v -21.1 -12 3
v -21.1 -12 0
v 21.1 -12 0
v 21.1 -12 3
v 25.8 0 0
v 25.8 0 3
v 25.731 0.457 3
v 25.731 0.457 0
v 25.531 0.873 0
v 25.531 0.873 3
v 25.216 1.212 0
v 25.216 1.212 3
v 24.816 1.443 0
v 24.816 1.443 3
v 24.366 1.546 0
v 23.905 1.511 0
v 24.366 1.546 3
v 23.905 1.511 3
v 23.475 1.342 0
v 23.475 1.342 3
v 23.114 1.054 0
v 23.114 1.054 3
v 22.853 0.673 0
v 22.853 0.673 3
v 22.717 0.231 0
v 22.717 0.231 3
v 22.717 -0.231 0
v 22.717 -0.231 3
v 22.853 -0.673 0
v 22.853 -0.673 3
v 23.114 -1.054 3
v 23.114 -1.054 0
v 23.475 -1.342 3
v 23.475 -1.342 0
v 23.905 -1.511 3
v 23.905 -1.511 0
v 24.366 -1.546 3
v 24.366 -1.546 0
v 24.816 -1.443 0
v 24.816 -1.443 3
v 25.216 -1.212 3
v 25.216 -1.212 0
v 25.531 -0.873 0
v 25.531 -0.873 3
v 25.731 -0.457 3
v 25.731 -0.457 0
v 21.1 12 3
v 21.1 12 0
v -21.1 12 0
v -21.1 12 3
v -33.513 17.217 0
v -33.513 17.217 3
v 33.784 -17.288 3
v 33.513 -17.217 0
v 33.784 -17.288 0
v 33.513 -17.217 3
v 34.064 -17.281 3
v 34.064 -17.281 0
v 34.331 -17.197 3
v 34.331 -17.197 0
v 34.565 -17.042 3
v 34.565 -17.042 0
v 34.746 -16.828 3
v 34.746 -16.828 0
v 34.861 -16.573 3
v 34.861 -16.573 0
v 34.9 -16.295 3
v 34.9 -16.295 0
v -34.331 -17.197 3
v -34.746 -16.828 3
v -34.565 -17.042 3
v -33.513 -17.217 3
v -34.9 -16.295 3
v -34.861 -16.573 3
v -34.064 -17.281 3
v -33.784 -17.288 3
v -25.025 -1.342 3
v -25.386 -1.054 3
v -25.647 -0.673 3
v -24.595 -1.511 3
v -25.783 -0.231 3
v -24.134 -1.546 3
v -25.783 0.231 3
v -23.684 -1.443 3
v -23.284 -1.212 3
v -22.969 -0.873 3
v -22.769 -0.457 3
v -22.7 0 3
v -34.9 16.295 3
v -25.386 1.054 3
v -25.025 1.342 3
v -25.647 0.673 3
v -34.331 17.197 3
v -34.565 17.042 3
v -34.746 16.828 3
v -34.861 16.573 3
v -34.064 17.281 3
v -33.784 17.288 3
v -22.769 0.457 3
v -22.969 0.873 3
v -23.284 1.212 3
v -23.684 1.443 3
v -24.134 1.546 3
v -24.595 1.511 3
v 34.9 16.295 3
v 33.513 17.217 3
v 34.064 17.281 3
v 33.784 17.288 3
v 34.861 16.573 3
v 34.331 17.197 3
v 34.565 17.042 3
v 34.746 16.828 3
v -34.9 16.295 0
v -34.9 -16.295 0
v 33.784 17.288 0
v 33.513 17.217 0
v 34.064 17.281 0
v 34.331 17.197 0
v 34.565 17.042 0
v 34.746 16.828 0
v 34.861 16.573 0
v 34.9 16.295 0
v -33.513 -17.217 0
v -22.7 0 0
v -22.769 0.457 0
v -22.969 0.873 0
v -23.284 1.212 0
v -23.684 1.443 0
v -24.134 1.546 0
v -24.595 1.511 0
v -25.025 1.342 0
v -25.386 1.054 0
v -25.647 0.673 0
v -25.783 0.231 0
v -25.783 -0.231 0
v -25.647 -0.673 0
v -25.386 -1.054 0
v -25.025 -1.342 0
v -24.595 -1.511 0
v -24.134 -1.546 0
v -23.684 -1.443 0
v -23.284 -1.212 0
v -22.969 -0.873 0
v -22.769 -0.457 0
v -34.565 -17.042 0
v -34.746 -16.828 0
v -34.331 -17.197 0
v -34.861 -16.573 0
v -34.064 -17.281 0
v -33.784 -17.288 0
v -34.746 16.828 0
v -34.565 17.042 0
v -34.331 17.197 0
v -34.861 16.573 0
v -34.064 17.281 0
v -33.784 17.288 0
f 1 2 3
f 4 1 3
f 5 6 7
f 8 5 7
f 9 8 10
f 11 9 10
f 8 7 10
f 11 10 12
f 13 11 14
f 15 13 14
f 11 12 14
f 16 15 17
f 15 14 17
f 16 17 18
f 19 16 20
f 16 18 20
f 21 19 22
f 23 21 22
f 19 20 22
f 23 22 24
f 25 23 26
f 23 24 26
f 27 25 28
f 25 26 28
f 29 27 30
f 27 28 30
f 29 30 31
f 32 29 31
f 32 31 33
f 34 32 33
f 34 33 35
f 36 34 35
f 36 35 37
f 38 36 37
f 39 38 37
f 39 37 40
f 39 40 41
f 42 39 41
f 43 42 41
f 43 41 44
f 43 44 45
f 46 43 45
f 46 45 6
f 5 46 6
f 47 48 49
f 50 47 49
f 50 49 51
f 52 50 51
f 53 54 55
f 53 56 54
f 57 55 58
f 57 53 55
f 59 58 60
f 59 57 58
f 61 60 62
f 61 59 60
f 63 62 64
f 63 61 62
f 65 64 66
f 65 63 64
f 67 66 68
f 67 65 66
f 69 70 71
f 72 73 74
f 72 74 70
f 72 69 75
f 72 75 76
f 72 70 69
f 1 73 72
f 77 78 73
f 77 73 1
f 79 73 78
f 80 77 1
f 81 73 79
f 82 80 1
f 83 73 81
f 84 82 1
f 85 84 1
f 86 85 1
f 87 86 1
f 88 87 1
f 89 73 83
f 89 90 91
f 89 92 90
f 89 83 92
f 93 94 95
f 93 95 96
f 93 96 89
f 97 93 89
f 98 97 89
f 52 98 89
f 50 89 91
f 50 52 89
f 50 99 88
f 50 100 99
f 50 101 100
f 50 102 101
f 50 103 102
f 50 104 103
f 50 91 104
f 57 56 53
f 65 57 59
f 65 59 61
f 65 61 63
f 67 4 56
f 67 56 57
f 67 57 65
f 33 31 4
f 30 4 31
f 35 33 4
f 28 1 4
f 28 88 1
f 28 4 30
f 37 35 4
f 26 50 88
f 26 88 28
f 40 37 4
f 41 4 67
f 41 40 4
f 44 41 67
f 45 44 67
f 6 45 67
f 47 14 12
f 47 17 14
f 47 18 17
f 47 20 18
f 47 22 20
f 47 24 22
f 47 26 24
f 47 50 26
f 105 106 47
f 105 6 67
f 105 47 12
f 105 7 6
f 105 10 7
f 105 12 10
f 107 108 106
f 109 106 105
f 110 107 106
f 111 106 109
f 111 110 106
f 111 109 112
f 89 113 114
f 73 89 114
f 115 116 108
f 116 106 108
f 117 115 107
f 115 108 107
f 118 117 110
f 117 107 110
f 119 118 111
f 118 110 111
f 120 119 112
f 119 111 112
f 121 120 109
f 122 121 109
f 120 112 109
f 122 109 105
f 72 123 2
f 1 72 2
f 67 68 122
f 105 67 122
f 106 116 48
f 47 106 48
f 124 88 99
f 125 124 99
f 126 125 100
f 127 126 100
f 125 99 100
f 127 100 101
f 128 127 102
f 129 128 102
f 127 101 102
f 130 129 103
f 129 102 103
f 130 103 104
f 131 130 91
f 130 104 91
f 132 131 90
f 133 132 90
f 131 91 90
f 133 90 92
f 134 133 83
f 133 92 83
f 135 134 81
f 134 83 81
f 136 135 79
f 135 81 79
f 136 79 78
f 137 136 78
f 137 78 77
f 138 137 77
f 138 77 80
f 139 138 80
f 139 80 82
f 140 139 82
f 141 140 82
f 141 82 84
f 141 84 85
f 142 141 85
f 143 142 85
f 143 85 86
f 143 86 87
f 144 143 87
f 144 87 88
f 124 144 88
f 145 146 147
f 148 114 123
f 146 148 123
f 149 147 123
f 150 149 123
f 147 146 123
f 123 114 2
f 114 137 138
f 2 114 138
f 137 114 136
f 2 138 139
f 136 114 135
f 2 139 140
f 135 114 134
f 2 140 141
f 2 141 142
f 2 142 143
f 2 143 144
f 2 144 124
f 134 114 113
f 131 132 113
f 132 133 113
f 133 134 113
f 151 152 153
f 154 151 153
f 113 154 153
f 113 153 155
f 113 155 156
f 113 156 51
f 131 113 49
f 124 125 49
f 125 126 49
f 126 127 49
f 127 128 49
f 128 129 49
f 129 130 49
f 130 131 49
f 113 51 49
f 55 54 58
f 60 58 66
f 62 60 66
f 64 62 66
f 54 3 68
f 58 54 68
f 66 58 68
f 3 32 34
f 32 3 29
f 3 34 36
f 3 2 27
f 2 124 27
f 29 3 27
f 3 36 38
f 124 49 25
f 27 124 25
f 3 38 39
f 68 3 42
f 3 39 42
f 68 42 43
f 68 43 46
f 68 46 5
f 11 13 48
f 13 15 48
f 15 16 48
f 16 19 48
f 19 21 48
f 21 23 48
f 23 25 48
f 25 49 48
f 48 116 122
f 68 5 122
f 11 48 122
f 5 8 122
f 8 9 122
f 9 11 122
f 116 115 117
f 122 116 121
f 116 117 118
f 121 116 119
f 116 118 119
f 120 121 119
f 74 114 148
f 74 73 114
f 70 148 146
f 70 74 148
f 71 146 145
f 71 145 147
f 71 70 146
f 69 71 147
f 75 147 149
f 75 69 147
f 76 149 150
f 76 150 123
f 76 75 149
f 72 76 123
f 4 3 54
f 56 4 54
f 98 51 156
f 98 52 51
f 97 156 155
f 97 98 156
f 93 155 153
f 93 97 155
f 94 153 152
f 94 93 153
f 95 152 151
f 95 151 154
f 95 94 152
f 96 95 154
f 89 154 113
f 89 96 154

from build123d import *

# Parameters (mm, degrees)
EXTRUDE_1_DEPTH     = 3
FILLET_1_R          = 1
SKETCH_2_R          = 1.55
CUT_EXTRUDE_1_DEPTH = 4


with BuildPart() as part:
    # Эскиз1 → Бобышка-Вытянуть1 (new body)
    with BuildSketch(Plane.XY):
        Polygon((34.9, -12), (34.9, 12), (34.9, 17.8), (21.1, 12), (-21.1, 12), (-34.9, 17.8), (-34.9, 12), (-34.9, -12), (-34.9, -17.8), (-21.1, -12), (21.1, -12), (34.9, -17.8), align=None)
    extrude(amount=EXTRUDE_1_DEPTH)

    # Скругление1
    fillet_1_edges = [part.edges().sort_by_distance(p)[0] for p in [
        (-34.9, 17.8, 1.5),
        (34.9, 17.8, 1.5),
        (34.9, -17.8, 1.5),
        (-34.9, -17.8, 1.5),
    ]]
    fillet(fillet_1_edges, radius=FILLET_1_R)

    # Эскиз2 → Вырез-Вытянуть1 (cut, through all)
    with BuildSketch(Plane.XY.offset(3)):
        with Locations((-24.25, 0)):
            Circle(SKETCH_2_R)
        with Locations((24.25, 0)):
            Circle(SKETCH_2_R)
    extrude(amount=-CUT_EXTRUDE_1_DEPTH, mode=Mode.SUBTRACT)


solid = part.part
